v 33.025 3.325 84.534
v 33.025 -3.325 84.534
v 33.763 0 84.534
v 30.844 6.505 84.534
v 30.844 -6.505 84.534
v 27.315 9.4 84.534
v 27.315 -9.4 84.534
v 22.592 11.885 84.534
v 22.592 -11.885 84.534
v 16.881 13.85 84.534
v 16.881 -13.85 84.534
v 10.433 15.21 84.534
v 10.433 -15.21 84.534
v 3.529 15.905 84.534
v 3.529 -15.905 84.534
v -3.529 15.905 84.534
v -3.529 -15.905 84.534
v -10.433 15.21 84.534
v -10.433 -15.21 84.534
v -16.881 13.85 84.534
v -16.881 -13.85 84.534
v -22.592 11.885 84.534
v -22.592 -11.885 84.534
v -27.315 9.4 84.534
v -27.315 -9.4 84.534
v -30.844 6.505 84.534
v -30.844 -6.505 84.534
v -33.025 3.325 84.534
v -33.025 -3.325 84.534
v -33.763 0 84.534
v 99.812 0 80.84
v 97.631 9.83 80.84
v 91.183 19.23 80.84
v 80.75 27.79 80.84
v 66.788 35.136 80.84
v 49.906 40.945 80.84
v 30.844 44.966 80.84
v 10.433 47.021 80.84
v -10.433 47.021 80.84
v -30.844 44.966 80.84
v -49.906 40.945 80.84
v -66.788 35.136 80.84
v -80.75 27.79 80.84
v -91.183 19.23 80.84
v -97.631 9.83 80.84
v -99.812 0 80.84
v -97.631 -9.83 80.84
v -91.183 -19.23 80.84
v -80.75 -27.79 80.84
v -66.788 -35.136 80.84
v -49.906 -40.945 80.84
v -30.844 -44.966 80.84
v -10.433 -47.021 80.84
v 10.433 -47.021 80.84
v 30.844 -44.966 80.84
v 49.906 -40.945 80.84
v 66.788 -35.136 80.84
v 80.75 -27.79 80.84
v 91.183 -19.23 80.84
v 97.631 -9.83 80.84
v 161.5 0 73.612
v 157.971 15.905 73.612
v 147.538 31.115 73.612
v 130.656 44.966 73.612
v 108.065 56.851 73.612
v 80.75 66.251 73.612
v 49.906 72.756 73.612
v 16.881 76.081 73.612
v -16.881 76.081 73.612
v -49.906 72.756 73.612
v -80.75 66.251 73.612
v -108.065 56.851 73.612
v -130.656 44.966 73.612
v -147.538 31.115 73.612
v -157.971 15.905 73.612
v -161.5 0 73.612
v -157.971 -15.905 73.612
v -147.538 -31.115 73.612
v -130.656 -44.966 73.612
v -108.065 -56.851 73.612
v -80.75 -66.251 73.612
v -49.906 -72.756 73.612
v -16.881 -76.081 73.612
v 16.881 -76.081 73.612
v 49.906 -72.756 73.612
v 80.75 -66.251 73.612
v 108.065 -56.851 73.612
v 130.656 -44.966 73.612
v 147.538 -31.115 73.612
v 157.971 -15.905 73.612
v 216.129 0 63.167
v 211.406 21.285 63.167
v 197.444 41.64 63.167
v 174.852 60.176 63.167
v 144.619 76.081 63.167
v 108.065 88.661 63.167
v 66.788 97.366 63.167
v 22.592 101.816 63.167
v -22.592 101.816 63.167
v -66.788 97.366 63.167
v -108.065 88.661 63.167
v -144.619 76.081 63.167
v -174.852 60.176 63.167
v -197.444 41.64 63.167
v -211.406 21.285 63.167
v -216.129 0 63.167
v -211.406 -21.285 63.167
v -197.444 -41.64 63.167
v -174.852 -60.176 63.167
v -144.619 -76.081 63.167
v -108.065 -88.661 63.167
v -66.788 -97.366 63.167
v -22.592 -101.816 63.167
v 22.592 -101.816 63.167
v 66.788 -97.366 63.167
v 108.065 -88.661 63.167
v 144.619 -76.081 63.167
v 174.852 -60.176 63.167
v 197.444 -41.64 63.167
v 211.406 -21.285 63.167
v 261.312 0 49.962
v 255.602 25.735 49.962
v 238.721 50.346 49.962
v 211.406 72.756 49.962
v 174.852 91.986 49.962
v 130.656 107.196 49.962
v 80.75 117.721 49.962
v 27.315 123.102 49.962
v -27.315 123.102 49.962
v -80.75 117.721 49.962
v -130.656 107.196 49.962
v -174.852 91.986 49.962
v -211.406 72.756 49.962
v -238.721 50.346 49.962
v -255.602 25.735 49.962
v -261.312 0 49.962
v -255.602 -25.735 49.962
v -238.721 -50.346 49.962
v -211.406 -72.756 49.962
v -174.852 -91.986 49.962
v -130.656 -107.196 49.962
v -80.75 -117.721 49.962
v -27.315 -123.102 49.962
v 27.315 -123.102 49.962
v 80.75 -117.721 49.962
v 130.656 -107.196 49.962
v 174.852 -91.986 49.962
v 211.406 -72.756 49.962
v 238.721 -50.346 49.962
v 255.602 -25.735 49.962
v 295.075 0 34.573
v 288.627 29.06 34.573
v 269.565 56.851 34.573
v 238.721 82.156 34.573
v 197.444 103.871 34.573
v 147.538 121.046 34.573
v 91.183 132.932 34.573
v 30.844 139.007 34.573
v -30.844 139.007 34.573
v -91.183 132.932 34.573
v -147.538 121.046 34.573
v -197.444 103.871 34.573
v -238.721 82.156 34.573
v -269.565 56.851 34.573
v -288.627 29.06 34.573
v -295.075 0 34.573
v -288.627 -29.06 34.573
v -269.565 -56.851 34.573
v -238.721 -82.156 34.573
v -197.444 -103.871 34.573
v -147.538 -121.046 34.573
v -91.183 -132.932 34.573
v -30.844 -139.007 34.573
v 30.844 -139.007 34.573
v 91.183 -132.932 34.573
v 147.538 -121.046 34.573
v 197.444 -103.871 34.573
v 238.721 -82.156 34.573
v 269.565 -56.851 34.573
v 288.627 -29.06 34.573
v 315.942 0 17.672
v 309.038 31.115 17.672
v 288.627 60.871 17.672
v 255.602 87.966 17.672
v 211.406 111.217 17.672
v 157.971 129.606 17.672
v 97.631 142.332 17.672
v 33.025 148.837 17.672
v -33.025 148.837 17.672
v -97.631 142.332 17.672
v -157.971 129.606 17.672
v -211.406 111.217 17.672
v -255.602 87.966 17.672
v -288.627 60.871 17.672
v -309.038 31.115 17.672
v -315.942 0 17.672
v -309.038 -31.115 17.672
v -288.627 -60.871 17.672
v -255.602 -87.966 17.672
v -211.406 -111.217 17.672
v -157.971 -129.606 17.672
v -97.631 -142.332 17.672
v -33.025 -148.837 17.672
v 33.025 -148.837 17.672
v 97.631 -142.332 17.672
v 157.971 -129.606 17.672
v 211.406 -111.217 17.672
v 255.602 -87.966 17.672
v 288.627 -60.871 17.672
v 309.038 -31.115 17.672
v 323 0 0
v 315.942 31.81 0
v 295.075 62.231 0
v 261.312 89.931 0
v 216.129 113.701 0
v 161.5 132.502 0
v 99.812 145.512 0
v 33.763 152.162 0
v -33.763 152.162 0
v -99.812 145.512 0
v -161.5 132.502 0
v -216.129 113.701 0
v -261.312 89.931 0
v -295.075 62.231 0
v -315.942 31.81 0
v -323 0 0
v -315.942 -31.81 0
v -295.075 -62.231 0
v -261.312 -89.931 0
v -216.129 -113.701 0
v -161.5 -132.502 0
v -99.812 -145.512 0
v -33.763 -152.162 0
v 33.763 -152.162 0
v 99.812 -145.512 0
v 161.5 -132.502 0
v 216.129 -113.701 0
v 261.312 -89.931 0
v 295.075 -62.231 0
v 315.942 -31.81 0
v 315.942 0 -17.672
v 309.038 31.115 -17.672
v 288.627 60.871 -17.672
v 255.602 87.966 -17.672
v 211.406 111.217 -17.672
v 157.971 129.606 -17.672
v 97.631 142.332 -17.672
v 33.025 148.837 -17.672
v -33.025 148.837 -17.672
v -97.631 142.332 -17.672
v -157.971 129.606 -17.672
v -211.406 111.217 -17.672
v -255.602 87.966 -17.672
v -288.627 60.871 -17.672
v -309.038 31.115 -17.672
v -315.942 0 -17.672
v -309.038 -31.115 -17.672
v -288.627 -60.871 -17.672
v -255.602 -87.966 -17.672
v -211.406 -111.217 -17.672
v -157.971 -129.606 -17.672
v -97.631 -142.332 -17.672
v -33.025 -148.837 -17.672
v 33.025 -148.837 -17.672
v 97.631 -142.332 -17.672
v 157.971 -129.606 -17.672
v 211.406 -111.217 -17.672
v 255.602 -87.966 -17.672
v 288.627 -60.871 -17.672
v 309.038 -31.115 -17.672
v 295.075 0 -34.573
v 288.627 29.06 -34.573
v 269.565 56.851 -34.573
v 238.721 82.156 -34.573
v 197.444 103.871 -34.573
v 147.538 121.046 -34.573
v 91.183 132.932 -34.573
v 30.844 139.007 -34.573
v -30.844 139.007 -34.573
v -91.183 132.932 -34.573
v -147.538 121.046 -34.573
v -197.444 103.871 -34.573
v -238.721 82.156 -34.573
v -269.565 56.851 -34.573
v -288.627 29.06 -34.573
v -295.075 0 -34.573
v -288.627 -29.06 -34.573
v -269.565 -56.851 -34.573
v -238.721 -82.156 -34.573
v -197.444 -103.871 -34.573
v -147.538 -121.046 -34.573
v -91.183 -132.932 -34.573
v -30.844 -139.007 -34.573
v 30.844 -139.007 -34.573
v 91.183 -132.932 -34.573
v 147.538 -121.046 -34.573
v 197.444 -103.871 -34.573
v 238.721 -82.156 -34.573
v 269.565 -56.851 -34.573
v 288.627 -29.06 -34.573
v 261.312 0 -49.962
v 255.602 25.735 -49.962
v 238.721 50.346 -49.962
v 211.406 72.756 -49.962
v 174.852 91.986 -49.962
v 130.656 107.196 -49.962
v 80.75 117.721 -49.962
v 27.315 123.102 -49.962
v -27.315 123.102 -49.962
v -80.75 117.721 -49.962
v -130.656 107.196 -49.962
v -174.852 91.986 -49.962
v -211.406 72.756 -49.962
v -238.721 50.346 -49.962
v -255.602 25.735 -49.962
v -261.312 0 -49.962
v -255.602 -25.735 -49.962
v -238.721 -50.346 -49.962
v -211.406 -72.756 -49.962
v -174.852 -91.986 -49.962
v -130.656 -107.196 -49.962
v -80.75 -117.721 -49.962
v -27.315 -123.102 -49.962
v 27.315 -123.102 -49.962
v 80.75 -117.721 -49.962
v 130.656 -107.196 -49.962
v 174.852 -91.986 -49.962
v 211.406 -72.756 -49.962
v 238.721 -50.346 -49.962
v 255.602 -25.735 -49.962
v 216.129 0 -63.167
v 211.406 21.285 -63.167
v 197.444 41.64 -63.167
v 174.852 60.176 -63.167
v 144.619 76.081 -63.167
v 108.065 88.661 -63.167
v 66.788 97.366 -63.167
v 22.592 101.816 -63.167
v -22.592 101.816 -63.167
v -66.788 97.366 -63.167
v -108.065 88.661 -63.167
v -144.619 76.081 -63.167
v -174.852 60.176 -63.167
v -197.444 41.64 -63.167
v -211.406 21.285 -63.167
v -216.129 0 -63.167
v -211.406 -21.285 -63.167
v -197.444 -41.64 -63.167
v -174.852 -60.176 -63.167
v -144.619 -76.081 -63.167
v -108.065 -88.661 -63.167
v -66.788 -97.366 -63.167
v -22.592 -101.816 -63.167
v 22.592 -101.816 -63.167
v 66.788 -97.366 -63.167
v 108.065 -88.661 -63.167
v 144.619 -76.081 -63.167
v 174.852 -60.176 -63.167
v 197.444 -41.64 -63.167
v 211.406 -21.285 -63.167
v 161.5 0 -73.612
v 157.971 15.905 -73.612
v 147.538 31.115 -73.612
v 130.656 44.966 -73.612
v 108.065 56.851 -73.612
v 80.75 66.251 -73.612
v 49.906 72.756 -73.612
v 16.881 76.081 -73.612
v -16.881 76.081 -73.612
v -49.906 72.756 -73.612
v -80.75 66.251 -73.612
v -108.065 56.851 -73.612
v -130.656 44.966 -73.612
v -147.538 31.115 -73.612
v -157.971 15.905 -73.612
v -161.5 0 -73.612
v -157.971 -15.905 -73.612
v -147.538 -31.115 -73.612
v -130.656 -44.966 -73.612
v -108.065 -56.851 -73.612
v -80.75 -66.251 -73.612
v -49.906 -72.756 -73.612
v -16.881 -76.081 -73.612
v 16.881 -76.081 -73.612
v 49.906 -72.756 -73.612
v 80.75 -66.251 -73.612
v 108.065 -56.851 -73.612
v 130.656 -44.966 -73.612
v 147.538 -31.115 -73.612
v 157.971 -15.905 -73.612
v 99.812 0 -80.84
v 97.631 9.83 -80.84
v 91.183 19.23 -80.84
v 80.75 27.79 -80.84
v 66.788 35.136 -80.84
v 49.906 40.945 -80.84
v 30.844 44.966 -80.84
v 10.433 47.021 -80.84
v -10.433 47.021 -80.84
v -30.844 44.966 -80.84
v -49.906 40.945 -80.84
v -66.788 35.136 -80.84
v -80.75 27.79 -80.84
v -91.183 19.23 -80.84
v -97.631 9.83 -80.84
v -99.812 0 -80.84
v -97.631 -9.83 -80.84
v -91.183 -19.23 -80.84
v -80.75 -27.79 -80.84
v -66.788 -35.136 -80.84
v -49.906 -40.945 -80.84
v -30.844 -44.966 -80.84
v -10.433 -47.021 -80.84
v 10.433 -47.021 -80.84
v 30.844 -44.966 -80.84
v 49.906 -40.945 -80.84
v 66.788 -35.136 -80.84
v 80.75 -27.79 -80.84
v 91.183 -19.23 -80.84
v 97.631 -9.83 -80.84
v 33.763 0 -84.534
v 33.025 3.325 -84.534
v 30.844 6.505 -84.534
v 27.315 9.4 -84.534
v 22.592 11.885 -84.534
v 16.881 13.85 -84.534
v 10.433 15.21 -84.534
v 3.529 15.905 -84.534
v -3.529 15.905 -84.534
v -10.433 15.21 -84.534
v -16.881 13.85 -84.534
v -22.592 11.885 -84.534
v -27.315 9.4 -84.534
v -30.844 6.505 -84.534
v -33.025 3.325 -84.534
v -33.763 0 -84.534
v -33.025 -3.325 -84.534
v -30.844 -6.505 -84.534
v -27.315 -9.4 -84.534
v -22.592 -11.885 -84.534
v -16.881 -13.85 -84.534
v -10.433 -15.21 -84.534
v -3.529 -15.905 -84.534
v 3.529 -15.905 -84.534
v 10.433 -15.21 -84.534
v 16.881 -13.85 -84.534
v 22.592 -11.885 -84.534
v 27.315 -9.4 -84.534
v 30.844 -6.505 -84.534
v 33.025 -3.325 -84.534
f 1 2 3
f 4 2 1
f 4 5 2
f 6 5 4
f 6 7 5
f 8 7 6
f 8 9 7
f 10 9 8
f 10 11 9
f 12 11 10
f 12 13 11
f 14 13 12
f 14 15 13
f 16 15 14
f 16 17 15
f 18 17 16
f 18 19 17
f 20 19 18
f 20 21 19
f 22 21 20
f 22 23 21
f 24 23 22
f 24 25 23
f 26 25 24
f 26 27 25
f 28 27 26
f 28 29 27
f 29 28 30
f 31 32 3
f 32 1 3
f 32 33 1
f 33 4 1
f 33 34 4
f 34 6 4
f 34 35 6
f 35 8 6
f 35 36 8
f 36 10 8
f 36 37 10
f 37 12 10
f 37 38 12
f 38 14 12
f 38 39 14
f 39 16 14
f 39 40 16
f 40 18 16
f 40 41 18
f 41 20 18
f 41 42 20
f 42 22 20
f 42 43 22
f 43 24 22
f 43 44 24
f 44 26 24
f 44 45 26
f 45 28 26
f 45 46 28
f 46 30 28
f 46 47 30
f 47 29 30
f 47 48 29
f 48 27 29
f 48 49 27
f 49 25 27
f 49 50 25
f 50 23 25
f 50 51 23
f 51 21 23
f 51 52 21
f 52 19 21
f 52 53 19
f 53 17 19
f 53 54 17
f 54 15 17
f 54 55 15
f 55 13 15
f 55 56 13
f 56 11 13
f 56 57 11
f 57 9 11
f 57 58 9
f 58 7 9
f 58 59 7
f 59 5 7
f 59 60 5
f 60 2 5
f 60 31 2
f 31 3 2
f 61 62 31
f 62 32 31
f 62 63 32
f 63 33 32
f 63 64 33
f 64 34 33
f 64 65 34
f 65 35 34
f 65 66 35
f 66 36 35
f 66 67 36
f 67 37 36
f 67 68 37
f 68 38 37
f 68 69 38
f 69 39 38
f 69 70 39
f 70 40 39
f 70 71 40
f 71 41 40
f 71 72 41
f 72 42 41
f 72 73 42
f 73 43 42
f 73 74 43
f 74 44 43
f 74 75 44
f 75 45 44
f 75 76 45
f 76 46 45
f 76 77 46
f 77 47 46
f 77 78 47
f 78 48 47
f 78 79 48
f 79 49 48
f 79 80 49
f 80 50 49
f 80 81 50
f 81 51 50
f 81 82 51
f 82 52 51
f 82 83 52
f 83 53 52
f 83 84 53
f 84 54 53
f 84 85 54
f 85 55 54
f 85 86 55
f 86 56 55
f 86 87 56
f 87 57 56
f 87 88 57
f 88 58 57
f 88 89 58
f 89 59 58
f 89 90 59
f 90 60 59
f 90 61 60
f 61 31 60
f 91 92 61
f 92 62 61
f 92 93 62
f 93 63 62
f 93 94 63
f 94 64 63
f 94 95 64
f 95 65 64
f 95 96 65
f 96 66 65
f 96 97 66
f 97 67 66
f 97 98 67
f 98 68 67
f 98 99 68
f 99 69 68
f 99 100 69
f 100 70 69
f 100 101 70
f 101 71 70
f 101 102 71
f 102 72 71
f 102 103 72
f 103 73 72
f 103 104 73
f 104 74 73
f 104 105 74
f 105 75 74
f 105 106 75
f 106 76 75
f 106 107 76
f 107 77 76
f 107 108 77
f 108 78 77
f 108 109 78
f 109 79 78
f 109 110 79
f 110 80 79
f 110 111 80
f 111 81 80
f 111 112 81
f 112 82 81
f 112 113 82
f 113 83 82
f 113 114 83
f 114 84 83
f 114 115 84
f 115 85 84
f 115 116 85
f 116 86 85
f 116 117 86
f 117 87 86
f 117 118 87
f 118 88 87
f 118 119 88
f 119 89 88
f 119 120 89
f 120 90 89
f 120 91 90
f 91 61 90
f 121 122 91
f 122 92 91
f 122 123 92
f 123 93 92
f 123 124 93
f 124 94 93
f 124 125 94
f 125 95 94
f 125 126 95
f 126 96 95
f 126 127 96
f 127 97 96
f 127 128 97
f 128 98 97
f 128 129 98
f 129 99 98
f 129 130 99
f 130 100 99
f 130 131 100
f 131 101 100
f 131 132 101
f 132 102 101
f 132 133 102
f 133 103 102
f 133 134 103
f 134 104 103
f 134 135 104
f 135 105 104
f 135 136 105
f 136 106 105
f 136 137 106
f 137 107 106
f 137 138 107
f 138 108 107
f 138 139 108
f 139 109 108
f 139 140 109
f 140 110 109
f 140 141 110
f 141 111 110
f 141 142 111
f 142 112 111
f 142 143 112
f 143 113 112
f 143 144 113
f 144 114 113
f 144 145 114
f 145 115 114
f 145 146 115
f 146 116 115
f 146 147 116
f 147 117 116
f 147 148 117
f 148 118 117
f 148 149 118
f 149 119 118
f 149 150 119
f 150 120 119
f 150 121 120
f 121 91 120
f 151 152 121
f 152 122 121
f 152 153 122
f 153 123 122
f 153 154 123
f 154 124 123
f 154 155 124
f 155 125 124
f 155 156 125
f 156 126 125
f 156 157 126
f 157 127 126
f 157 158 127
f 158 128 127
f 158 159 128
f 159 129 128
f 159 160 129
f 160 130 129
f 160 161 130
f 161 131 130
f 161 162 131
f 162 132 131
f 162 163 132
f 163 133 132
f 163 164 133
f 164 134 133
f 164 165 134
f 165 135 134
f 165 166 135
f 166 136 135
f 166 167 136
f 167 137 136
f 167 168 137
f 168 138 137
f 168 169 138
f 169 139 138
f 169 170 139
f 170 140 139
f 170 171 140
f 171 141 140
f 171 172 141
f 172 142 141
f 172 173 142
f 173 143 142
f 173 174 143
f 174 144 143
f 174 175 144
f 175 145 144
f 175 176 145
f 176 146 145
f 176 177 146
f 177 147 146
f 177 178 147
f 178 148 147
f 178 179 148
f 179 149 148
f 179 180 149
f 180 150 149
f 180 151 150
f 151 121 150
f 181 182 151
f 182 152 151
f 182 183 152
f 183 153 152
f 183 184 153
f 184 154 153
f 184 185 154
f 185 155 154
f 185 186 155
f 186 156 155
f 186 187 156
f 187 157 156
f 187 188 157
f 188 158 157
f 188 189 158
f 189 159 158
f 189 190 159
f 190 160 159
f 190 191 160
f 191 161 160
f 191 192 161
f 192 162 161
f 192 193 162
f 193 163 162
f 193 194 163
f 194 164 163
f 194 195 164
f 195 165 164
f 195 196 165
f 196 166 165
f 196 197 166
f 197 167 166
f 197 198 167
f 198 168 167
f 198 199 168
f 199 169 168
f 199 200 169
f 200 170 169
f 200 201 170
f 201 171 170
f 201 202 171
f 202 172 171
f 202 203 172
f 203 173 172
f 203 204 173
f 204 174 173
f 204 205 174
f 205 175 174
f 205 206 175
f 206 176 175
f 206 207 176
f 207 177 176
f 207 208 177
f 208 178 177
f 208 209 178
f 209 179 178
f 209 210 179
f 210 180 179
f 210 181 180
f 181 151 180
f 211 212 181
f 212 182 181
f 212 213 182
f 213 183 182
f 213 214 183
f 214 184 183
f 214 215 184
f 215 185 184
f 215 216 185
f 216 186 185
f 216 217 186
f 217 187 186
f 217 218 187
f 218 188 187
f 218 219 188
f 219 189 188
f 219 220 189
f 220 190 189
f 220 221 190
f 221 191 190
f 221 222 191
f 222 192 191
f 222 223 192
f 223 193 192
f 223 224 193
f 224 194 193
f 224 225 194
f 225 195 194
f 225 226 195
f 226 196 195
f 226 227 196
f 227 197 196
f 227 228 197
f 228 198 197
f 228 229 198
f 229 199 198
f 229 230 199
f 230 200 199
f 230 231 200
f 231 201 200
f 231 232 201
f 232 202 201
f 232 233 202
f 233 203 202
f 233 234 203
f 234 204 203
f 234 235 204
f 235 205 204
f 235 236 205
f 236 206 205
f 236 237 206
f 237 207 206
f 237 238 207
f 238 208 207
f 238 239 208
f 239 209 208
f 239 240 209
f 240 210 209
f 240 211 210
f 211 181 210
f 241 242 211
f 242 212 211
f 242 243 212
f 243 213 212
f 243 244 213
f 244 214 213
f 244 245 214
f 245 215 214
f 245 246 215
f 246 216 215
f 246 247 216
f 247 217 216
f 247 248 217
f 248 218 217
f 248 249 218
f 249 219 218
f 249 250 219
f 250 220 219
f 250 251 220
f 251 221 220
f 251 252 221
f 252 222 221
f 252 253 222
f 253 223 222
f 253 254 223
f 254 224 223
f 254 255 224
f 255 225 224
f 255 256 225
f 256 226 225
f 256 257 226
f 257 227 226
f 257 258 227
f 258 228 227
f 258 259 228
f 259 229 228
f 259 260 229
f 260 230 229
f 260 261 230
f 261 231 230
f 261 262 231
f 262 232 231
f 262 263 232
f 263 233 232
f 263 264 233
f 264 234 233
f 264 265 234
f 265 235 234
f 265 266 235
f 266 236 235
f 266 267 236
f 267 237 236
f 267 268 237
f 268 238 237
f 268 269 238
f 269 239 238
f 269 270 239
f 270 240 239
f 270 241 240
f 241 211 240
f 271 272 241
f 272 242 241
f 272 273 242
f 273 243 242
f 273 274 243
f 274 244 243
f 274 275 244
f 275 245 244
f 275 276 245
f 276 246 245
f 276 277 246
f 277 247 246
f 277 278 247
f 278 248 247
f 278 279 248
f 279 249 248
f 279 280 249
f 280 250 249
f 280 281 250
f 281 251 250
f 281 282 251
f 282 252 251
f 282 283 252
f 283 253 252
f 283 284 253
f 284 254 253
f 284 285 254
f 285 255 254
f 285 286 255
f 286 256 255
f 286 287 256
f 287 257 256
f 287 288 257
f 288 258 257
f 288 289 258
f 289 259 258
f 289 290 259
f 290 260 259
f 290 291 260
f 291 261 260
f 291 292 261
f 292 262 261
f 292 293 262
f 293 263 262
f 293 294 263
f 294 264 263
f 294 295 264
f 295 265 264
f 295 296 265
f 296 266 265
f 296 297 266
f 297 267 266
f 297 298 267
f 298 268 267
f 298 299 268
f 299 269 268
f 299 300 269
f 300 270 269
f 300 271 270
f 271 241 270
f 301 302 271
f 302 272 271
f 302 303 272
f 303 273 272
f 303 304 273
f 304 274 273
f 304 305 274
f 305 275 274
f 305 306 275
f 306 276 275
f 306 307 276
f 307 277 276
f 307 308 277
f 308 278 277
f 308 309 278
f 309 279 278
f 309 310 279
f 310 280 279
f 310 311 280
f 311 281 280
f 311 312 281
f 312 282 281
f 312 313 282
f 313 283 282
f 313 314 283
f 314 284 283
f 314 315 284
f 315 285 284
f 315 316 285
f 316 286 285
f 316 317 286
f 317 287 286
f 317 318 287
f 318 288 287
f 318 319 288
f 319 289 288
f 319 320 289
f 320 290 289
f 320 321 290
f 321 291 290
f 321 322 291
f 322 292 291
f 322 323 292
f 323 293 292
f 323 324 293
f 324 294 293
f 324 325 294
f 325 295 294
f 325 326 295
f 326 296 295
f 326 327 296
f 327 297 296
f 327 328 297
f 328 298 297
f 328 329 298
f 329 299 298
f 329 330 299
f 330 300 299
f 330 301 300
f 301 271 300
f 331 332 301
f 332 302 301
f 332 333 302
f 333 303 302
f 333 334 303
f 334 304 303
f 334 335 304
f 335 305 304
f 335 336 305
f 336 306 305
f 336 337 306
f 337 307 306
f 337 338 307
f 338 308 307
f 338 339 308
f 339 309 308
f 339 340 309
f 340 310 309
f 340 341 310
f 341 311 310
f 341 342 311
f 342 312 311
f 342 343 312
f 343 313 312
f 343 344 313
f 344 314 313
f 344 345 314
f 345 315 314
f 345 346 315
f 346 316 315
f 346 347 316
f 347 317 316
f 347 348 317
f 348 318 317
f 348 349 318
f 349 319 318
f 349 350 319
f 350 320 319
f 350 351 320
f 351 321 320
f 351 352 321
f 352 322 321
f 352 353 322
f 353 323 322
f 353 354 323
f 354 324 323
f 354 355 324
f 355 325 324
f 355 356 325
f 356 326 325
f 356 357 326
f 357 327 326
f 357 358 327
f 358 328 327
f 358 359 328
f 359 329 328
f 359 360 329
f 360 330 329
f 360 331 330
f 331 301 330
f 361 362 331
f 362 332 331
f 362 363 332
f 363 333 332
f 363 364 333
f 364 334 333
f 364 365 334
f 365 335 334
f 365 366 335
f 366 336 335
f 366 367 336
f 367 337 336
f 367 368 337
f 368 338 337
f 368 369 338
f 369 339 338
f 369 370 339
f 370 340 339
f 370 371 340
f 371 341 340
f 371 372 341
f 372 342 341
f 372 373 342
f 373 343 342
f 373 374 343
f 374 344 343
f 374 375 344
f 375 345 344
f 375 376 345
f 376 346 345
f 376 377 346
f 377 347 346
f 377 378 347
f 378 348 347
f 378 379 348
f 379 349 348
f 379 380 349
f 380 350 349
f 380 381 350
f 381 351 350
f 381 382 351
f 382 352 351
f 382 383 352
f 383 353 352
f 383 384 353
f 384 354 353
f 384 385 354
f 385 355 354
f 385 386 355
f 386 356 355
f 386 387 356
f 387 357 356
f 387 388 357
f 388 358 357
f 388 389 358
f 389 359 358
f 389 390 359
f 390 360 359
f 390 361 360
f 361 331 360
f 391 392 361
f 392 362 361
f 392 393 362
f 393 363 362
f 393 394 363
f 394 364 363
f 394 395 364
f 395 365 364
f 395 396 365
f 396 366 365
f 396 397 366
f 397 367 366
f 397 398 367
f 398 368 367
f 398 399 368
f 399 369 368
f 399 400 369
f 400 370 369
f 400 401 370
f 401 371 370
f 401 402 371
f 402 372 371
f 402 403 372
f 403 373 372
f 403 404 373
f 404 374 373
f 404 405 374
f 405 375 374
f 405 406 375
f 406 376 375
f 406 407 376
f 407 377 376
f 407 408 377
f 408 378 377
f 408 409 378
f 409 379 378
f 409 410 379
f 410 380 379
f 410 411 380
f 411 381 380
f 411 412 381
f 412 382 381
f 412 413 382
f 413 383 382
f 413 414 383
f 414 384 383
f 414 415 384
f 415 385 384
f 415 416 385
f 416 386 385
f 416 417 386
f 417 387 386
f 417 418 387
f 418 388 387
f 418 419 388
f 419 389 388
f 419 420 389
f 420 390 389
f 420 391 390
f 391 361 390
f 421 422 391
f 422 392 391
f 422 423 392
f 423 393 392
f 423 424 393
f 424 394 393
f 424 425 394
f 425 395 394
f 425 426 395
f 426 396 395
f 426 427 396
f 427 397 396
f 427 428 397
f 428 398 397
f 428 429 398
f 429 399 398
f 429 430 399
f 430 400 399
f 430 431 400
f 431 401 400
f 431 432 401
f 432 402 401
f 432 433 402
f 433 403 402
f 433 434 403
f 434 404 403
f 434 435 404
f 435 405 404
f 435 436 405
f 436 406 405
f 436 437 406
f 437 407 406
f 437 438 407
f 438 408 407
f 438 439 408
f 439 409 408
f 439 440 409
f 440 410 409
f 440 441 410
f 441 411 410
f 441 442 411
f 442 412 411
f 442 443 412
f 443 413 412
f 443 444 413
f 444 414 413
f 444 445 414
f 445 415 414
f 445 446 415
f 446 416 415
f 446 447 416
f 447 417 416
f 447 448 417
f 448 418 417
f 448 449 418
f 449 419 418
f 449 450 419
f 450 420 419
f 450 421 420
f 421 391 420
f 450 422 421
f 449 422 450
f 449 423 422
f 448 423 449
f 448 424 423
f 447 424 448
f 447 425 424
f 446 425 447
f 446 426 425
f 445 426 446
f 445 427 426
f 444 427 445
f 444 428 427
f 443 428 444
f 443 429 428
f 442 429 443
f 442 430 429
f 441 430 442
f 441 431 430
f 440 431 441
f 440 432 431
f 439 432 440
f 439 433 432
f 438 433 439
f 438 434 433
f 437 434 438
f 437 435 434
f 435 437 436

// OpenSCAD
// Generated by SolidPython 1.0.1 on 2020-07-29 00:46:53


scale(v = [19, 9, 5]) {
	sphere(r = 17);
}
/***********************************************
*********      SolidPython code:      **********
************************************************
 
# import packages: SolidPython
from solid import *
from solid.utils import *
from itertools import chain, combinations, permutations


class Resize:

    def __init__(self, scad_file):
        self.scad_file = scad_file
        #self.scad_file = import_scad(scad_file)
        # cone/cylinder param:
        self.r1 = 0
        self.r2 = 0
        self.h = 0
        # rectangular prism param:
        self.w = 0
        self.l = 0
        # ellipse param:
        self.r = 0

    # import OpenScad code (file name corresponds to shape)


    # classify shape + parameters
    def assign(self, param1, param2, param3):
        if self.scad_file == 'cone.scad':
            self.r1 = param1
            self.r2 = param2
            self.h = param3
        elif self.scad_file == 'cylinder.scad':
            self.r1 = param1
            self.r2 = param2
            self.h = param3
        elif self.scad_file == 'rectangularPrism.scad':
            self.h = param1
            self.l = param2
            self.w = param3
        else:
            self.r = param1
            self.h = param2

    # resize parameters
    def iterate(self):
        x = range(3, 20, 2)
        i = 1
        if self.scad_file == 'cone.scad':
            tempList = list(permutations(x, 2))
            for temp in tempList:
                param1 = temp[0]
                param2 = temp[1]
                filepath = 'produced_scad_files/' + 'cone' + str(param1) + '_' + str(param2) + '_' + '.scad'
                scad_render_to_file(cylinder(h=param1, r1=param2, r2=0), filepath)

        elif self.scad_file == 'cylinder.scad':
            tempList = list(permutations(x, 3))
            for temp in tempList:
                param1 = temp[0]
                param2 = temp[1]
                filepath = 'produced_scad_files/' + 'cylinder' + str(param1) + '_' + str(param2) + '_' + '.scad'
                scad_render_to_file(cylinder(h=param1, r1=param2, r2=param2), filepath)

        elif self.scad_file == 'rectangularPrism.scad':
            tempList = list(permutations(x, 3))
            for temp in tempList:
                param1 = temp[0]
                param2 = temp[1]
                param3 = temp[2]
                filepath = 'produced_scad_files/' + 'rectangularPrism' + str(param1) + '_' + str(param2) + '_' + str(
                    param3) + '.scad'
                scad_render_to_file(cube(size=(param1, param2, param3)), filepath)

        elif self.scad_file == 'ellipse.scad':
            tempList = list(permutations(x, 4))
            for temp in tempList:
                param1 = temp[0]
                param2 = temp[1]
                param3 = temp[2]
                param4 = temp[3]
                filepath = 'produced_scad_files/' + 'ellipse' + str(param1) + '_' + str(param2) + '_' + str(param3) + '_' + str(param4) + '.scad'
                scad_render_to_file(scale([param1, param2, param3])(sphere(r=param4)), filepath)

    def render_to_scadfile(self):
        scad_render_to_file(scad, 'example.scad') 
 
************************************************/
